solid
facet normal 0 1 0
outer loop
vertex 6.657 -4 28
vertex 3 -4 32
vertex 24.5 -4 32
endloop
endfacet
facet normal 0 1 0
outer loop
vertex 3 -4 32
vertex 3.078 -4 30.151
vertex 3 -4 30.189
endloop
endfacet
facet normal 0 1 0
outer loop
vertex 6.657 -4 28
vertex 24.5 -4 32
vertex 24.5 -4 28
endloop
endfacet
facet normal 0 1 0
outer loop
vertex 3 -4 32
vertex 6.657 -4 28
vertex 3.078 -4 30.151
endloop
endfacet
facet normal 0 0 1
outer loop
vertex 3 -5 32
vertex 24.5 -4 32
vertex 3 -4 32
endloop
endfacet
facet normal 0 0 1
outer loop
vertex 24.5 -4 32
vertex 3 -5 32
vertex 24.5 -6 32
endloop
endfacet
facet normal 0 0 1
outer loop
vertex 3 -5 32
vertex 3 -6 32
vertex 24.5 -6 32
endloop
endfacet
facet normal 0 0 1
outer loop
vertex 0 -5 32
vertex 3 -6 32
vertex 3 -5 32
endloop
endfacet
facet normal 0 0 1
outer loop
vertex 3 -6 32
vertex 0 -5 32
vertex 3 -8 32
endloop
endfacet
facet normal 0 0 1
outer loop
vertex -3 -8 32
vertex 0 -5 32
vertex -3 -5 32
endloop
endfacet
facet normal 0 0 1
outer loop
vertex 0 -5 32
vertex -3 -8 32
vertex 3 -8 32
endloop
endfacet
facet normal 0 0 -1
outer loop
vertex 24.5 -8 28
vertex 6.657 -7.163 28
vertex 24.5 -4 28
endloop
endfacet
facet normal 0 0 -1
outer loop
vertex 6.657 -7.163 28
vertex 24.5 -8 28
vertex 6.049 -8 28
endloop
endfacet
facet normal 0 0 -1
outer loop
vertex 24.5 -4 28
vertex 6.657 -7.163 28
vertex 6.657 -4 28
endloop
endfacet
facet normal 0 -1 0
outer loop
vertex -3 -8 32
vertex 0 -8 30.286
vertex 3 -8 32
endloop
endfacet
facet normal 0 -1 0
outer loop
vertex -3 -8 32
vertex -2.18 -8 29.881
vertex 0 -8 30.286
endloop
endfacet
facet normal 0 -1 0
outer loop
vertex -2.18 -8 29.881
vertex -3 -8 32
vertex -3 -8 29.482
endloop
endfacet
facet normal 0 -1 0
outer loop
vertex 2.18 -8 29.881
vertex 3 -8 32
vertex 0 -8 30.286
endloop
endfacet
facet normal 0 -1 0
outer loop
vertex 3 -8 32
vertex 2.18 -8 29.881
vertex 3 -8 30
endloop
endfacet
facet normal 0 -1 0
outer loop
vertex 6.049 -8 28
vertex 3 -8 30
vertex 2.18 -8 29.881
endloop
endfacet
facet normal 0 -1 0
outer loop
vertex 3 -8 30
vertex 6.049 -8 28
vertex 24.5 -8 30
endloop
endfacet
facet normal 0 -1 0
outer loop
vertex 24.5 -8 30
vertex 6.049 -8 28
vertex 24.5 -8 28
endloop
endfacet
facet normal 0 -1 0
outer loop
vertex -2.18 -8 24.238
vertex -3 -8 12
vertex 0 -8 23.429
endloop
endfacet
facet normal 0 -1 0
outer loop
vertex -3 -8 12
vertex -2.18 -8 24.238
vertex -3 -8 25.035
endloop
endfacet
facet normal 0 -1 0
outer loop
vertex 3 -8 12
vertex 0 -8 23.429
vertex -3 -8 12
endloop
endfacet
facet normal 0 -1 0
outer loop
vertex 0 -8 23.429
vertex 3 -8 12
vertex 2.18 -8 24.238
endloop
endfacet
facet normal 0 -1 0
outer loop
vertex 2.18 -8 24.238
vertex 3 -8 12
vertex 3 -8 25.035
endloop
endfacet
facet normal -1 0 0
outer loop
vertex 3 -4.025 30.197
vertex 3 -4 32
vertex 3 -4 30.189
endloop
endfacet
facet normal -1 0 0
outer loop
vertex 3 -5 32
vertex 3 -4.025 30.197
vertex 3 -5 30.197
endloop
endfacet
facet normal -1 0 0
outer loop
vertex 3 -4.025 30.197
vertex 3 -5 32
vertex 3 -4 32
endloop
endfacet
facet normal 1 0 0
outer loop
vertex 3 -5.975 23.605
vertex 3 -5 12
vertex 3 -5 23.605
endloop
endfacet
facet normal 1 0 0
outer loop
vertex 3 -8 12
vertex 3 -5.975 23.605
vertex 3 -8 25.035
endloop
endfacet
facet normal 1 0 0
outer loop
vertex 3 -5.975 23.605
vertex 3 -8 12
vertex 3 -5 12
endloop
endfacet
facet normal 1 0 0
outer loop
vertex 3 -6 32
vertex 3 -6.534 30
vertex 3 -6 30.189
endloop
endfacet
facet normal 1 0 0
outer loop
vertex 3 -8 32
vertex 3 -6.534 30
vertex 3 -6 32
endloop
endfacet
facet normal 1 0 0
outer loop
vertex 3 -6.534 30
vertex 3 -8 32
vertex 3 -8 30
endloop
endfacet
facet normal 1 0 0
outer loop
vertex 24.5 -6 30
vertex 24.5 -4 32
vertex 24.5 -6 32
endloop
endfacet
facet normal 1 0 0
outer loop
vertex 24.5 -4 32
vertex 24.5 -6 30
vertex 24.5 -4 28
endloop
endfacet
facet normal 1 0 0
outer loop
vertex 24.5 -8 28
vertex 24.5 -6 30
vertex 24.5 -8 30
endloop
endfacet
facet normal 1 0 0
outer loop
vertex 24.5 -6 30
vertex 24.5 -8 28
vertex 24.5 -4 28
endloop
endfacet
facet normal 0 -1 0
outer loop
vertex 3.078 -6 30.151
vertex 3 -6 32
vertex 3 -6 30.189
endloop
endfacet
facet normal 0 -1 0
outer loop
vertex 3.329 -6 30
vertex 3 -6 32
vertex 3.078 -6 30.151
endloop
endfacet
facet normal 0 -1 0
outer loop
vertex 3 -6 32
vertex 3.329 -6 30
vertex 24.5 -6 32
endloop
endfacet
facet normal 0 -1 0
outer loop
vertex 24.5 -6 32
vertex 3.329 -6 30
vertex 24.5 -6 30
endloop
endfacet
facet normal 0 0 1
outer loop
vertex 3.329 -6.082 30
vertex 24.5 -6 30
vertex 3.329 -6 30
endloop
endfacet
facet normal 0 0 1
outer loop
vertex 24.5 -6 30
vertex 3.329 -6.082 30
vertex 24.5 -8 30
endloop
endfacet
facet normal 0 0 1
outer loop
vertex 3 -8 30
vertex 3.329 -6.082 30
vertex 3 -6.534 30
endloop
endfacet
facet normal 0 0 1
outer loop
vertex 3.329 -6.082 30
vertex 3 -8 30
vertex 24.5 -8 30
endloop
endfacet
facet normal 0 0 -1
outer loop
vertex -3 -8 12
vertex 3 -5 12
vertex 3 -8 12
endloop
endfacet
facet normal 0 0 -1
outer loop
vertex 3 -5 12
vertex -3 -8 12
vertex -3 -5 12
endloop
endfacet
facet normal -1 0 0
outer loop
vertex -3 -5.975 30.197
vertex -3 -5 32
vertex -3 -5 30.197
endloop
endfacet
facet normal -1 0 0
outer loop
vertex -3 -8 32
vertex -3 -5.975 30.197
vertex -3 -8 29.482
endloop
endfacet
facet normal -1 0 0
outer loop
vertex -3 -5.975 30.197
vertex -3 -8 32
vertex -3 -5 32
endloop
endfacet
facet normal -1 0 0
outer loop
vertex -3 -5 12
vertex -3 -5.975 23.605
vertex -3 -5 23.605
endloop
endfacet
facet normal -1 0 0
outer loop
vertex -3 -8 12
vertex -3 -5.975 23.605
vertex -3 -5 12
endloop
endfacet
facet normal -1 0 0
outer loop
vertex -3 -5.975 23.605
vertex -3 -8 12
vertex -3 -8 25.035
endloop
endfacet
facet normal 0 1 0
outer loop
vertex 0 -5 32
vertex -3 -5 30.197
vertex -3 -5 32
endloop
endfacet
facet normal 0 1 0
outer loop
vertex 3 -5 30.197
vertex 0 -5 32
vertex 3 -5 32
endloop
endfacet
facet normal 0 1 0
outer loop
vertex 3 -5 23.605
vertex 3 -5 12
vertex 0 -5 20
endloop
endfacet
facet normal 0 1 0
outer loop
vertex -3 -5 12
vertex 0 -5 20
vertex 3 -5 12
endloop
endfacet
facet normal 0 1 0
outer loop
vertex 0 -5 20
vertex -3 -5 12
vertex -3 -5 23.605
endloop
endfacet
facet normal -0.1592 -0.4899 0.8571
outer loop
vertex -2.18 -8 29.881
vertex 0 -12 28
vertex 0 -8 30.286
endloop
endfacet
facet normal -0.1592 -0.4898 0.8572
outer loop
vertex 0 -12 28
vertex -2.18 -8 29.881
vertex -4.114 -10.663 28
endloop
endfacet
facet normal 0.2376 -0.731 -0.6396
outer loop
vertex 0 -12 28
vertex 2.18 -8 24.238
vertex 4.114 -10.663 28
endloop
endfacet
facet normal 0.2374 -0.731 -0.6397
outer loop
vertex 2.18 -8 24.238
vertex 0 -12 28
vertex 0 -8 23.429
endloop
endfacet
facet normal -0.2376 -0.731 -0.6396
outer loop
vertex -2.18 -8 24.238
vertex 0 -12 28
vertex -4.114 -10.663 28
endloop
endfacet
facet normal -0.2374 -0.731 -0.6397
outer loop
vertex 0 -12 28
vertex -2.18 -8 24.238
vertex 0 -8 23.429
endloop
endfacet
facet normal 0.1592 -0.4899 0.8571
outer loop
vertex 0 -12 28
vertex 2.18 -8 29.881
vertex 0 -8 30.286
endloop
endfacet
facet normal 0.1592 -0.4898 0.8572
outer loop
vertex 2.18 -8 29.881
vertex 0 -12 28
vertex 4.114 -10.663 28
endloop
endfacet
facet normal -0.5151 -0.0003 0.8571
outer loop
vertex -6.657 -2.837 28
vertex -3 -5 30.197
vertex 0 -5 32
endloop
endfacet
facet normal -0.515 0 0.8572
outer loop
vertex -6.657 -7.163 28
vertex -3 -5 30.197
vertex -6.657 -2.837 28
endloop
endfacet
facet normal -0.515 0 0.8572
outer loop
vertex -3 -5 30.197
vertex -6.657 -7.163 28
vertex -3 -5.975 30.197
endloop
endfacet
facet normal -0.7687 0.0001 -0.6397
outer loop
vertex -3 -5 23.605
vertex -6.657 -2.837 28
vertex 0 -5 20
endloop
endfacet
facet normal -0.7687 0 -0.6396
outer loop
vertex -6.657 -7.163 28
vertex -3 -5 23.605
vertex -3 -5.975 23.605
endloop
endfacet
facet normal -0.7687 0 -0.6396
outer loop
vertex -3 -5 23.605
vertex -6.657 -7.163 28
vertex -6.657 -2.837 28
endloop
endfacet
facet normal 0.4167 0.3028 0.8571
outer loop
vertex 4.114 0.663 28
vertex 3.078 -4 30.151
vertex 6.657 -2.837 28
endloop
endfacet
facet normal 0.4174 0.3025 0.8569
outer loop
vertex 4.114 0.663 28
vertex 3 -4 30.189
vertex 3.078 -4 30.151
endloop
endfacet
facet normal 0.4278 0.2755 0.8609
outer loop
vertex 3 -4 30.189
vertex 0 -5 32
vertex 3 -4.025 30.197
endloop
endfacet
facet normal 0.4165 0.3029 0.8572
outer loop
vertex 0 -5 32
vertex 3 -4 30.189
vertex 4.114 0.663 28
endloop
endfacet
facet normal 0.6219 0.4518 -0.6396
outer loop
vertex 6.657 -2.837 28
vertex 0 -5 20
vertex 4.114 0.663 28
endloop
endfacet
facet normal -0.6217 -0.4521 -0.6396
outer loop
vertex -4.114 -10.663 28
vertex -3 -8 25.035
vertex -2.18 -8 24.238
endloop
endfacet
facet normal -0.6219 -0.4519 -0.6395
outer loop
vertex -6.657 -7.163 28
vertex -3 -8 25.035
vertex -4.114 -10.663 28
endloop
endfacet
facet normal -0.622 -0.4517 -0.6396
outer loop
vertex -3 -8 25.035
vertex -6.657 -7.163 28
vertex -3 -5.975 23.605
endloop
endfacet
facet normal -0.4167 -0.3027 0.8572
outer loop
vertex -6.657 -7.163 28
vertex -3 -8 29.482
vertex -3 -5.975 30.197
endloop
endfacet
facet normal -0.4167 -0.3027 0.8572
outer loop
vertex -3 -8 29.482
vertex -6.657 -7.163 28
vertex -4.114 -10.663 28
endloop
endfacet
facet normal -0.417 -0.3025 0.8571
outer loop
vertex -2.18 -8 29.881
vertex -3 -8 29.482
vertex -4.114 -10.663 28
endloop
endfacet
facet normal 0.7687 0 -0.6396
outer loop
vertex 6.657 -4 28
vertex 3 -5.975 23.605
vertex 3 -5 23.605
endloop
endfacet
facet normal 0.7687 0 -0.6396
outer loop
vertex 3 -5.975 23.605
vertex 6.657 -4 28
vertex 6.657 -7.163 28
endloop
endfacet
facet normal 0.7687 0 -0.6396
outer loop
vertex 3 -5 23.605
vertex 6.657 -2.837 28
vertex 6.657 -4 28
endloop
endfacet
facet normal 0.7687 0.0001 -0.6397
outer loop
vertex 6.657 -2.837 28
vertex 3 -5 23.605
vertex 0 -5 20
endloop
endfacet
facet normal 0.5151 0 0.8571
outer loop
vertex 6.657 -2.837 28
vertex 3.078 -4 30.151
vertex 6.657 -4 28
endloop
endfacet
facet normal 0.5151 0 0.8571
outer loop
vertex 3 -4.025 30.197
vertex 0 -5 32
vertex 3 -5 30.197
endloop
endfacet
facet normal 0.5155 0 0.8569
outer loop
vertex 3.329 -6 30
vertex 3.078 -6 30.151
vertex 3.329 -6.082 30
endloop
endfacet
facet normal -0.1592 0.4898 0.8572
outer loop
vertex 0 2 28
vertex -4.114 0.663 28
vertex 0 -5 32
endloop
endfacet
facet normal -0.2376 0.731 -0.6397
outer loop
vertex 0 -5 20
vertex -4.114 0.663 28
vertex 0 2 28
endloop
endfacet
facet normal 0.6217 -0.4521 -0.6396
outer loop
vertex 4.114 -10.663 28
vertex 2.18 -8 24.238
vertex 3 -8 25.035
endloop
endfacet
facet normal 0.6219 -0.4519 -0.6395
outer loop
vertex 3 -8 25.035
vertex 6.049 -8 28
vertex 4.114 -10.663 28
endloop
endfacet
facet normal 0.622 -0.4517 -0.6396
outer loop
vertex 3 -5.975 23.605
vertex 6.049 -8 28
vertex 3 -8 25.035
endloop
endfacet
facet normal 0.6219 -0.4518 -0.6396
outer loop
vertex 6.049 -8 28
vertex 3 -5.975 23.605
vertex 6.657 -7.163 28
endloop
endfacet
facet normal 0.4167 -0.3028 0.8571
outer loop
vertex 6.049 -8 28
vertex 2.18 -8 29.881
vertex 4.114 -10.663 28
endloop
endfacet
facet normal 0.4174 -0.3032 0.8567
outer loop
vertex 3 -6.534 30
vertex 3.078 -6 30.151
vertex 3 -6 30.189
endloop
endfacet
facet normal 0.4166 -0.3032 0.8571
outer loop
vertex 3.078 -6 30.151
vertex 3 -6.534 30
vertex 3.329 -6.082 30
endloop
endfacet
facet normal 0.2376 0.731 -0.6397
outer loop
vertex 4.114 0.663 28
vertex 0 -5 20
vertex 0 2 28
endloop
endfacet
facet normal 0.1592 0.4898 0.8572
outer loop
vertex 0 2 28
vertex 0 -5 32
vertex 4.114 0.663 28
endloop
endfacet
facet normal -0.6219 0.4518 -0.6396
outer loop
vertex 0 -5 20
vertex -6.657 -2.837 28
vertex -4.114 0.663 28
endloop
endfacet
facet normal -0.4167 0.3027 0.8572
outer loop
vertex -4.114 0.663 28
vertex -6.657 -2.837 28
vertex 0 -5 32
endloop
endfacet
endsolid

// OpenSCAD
translate([54.5, -10, 2])
    rotate(90)
	translate([2,30,26]) {
	    difference() {
		cube(size = [4, 21.5, 4]);
		translate([-0.1,-1.1,2]) cube(size = [2.1, 23.5, 2.1]);
	    }
	}

translate([-3,-8,12]) cube(size = [6, 3, 20]);
translate([0, -5, 2]) rotate(90) rotate_extrude($fn = 10) polygon(points = [[0, 18], [0, 30], [7, 26]]);
